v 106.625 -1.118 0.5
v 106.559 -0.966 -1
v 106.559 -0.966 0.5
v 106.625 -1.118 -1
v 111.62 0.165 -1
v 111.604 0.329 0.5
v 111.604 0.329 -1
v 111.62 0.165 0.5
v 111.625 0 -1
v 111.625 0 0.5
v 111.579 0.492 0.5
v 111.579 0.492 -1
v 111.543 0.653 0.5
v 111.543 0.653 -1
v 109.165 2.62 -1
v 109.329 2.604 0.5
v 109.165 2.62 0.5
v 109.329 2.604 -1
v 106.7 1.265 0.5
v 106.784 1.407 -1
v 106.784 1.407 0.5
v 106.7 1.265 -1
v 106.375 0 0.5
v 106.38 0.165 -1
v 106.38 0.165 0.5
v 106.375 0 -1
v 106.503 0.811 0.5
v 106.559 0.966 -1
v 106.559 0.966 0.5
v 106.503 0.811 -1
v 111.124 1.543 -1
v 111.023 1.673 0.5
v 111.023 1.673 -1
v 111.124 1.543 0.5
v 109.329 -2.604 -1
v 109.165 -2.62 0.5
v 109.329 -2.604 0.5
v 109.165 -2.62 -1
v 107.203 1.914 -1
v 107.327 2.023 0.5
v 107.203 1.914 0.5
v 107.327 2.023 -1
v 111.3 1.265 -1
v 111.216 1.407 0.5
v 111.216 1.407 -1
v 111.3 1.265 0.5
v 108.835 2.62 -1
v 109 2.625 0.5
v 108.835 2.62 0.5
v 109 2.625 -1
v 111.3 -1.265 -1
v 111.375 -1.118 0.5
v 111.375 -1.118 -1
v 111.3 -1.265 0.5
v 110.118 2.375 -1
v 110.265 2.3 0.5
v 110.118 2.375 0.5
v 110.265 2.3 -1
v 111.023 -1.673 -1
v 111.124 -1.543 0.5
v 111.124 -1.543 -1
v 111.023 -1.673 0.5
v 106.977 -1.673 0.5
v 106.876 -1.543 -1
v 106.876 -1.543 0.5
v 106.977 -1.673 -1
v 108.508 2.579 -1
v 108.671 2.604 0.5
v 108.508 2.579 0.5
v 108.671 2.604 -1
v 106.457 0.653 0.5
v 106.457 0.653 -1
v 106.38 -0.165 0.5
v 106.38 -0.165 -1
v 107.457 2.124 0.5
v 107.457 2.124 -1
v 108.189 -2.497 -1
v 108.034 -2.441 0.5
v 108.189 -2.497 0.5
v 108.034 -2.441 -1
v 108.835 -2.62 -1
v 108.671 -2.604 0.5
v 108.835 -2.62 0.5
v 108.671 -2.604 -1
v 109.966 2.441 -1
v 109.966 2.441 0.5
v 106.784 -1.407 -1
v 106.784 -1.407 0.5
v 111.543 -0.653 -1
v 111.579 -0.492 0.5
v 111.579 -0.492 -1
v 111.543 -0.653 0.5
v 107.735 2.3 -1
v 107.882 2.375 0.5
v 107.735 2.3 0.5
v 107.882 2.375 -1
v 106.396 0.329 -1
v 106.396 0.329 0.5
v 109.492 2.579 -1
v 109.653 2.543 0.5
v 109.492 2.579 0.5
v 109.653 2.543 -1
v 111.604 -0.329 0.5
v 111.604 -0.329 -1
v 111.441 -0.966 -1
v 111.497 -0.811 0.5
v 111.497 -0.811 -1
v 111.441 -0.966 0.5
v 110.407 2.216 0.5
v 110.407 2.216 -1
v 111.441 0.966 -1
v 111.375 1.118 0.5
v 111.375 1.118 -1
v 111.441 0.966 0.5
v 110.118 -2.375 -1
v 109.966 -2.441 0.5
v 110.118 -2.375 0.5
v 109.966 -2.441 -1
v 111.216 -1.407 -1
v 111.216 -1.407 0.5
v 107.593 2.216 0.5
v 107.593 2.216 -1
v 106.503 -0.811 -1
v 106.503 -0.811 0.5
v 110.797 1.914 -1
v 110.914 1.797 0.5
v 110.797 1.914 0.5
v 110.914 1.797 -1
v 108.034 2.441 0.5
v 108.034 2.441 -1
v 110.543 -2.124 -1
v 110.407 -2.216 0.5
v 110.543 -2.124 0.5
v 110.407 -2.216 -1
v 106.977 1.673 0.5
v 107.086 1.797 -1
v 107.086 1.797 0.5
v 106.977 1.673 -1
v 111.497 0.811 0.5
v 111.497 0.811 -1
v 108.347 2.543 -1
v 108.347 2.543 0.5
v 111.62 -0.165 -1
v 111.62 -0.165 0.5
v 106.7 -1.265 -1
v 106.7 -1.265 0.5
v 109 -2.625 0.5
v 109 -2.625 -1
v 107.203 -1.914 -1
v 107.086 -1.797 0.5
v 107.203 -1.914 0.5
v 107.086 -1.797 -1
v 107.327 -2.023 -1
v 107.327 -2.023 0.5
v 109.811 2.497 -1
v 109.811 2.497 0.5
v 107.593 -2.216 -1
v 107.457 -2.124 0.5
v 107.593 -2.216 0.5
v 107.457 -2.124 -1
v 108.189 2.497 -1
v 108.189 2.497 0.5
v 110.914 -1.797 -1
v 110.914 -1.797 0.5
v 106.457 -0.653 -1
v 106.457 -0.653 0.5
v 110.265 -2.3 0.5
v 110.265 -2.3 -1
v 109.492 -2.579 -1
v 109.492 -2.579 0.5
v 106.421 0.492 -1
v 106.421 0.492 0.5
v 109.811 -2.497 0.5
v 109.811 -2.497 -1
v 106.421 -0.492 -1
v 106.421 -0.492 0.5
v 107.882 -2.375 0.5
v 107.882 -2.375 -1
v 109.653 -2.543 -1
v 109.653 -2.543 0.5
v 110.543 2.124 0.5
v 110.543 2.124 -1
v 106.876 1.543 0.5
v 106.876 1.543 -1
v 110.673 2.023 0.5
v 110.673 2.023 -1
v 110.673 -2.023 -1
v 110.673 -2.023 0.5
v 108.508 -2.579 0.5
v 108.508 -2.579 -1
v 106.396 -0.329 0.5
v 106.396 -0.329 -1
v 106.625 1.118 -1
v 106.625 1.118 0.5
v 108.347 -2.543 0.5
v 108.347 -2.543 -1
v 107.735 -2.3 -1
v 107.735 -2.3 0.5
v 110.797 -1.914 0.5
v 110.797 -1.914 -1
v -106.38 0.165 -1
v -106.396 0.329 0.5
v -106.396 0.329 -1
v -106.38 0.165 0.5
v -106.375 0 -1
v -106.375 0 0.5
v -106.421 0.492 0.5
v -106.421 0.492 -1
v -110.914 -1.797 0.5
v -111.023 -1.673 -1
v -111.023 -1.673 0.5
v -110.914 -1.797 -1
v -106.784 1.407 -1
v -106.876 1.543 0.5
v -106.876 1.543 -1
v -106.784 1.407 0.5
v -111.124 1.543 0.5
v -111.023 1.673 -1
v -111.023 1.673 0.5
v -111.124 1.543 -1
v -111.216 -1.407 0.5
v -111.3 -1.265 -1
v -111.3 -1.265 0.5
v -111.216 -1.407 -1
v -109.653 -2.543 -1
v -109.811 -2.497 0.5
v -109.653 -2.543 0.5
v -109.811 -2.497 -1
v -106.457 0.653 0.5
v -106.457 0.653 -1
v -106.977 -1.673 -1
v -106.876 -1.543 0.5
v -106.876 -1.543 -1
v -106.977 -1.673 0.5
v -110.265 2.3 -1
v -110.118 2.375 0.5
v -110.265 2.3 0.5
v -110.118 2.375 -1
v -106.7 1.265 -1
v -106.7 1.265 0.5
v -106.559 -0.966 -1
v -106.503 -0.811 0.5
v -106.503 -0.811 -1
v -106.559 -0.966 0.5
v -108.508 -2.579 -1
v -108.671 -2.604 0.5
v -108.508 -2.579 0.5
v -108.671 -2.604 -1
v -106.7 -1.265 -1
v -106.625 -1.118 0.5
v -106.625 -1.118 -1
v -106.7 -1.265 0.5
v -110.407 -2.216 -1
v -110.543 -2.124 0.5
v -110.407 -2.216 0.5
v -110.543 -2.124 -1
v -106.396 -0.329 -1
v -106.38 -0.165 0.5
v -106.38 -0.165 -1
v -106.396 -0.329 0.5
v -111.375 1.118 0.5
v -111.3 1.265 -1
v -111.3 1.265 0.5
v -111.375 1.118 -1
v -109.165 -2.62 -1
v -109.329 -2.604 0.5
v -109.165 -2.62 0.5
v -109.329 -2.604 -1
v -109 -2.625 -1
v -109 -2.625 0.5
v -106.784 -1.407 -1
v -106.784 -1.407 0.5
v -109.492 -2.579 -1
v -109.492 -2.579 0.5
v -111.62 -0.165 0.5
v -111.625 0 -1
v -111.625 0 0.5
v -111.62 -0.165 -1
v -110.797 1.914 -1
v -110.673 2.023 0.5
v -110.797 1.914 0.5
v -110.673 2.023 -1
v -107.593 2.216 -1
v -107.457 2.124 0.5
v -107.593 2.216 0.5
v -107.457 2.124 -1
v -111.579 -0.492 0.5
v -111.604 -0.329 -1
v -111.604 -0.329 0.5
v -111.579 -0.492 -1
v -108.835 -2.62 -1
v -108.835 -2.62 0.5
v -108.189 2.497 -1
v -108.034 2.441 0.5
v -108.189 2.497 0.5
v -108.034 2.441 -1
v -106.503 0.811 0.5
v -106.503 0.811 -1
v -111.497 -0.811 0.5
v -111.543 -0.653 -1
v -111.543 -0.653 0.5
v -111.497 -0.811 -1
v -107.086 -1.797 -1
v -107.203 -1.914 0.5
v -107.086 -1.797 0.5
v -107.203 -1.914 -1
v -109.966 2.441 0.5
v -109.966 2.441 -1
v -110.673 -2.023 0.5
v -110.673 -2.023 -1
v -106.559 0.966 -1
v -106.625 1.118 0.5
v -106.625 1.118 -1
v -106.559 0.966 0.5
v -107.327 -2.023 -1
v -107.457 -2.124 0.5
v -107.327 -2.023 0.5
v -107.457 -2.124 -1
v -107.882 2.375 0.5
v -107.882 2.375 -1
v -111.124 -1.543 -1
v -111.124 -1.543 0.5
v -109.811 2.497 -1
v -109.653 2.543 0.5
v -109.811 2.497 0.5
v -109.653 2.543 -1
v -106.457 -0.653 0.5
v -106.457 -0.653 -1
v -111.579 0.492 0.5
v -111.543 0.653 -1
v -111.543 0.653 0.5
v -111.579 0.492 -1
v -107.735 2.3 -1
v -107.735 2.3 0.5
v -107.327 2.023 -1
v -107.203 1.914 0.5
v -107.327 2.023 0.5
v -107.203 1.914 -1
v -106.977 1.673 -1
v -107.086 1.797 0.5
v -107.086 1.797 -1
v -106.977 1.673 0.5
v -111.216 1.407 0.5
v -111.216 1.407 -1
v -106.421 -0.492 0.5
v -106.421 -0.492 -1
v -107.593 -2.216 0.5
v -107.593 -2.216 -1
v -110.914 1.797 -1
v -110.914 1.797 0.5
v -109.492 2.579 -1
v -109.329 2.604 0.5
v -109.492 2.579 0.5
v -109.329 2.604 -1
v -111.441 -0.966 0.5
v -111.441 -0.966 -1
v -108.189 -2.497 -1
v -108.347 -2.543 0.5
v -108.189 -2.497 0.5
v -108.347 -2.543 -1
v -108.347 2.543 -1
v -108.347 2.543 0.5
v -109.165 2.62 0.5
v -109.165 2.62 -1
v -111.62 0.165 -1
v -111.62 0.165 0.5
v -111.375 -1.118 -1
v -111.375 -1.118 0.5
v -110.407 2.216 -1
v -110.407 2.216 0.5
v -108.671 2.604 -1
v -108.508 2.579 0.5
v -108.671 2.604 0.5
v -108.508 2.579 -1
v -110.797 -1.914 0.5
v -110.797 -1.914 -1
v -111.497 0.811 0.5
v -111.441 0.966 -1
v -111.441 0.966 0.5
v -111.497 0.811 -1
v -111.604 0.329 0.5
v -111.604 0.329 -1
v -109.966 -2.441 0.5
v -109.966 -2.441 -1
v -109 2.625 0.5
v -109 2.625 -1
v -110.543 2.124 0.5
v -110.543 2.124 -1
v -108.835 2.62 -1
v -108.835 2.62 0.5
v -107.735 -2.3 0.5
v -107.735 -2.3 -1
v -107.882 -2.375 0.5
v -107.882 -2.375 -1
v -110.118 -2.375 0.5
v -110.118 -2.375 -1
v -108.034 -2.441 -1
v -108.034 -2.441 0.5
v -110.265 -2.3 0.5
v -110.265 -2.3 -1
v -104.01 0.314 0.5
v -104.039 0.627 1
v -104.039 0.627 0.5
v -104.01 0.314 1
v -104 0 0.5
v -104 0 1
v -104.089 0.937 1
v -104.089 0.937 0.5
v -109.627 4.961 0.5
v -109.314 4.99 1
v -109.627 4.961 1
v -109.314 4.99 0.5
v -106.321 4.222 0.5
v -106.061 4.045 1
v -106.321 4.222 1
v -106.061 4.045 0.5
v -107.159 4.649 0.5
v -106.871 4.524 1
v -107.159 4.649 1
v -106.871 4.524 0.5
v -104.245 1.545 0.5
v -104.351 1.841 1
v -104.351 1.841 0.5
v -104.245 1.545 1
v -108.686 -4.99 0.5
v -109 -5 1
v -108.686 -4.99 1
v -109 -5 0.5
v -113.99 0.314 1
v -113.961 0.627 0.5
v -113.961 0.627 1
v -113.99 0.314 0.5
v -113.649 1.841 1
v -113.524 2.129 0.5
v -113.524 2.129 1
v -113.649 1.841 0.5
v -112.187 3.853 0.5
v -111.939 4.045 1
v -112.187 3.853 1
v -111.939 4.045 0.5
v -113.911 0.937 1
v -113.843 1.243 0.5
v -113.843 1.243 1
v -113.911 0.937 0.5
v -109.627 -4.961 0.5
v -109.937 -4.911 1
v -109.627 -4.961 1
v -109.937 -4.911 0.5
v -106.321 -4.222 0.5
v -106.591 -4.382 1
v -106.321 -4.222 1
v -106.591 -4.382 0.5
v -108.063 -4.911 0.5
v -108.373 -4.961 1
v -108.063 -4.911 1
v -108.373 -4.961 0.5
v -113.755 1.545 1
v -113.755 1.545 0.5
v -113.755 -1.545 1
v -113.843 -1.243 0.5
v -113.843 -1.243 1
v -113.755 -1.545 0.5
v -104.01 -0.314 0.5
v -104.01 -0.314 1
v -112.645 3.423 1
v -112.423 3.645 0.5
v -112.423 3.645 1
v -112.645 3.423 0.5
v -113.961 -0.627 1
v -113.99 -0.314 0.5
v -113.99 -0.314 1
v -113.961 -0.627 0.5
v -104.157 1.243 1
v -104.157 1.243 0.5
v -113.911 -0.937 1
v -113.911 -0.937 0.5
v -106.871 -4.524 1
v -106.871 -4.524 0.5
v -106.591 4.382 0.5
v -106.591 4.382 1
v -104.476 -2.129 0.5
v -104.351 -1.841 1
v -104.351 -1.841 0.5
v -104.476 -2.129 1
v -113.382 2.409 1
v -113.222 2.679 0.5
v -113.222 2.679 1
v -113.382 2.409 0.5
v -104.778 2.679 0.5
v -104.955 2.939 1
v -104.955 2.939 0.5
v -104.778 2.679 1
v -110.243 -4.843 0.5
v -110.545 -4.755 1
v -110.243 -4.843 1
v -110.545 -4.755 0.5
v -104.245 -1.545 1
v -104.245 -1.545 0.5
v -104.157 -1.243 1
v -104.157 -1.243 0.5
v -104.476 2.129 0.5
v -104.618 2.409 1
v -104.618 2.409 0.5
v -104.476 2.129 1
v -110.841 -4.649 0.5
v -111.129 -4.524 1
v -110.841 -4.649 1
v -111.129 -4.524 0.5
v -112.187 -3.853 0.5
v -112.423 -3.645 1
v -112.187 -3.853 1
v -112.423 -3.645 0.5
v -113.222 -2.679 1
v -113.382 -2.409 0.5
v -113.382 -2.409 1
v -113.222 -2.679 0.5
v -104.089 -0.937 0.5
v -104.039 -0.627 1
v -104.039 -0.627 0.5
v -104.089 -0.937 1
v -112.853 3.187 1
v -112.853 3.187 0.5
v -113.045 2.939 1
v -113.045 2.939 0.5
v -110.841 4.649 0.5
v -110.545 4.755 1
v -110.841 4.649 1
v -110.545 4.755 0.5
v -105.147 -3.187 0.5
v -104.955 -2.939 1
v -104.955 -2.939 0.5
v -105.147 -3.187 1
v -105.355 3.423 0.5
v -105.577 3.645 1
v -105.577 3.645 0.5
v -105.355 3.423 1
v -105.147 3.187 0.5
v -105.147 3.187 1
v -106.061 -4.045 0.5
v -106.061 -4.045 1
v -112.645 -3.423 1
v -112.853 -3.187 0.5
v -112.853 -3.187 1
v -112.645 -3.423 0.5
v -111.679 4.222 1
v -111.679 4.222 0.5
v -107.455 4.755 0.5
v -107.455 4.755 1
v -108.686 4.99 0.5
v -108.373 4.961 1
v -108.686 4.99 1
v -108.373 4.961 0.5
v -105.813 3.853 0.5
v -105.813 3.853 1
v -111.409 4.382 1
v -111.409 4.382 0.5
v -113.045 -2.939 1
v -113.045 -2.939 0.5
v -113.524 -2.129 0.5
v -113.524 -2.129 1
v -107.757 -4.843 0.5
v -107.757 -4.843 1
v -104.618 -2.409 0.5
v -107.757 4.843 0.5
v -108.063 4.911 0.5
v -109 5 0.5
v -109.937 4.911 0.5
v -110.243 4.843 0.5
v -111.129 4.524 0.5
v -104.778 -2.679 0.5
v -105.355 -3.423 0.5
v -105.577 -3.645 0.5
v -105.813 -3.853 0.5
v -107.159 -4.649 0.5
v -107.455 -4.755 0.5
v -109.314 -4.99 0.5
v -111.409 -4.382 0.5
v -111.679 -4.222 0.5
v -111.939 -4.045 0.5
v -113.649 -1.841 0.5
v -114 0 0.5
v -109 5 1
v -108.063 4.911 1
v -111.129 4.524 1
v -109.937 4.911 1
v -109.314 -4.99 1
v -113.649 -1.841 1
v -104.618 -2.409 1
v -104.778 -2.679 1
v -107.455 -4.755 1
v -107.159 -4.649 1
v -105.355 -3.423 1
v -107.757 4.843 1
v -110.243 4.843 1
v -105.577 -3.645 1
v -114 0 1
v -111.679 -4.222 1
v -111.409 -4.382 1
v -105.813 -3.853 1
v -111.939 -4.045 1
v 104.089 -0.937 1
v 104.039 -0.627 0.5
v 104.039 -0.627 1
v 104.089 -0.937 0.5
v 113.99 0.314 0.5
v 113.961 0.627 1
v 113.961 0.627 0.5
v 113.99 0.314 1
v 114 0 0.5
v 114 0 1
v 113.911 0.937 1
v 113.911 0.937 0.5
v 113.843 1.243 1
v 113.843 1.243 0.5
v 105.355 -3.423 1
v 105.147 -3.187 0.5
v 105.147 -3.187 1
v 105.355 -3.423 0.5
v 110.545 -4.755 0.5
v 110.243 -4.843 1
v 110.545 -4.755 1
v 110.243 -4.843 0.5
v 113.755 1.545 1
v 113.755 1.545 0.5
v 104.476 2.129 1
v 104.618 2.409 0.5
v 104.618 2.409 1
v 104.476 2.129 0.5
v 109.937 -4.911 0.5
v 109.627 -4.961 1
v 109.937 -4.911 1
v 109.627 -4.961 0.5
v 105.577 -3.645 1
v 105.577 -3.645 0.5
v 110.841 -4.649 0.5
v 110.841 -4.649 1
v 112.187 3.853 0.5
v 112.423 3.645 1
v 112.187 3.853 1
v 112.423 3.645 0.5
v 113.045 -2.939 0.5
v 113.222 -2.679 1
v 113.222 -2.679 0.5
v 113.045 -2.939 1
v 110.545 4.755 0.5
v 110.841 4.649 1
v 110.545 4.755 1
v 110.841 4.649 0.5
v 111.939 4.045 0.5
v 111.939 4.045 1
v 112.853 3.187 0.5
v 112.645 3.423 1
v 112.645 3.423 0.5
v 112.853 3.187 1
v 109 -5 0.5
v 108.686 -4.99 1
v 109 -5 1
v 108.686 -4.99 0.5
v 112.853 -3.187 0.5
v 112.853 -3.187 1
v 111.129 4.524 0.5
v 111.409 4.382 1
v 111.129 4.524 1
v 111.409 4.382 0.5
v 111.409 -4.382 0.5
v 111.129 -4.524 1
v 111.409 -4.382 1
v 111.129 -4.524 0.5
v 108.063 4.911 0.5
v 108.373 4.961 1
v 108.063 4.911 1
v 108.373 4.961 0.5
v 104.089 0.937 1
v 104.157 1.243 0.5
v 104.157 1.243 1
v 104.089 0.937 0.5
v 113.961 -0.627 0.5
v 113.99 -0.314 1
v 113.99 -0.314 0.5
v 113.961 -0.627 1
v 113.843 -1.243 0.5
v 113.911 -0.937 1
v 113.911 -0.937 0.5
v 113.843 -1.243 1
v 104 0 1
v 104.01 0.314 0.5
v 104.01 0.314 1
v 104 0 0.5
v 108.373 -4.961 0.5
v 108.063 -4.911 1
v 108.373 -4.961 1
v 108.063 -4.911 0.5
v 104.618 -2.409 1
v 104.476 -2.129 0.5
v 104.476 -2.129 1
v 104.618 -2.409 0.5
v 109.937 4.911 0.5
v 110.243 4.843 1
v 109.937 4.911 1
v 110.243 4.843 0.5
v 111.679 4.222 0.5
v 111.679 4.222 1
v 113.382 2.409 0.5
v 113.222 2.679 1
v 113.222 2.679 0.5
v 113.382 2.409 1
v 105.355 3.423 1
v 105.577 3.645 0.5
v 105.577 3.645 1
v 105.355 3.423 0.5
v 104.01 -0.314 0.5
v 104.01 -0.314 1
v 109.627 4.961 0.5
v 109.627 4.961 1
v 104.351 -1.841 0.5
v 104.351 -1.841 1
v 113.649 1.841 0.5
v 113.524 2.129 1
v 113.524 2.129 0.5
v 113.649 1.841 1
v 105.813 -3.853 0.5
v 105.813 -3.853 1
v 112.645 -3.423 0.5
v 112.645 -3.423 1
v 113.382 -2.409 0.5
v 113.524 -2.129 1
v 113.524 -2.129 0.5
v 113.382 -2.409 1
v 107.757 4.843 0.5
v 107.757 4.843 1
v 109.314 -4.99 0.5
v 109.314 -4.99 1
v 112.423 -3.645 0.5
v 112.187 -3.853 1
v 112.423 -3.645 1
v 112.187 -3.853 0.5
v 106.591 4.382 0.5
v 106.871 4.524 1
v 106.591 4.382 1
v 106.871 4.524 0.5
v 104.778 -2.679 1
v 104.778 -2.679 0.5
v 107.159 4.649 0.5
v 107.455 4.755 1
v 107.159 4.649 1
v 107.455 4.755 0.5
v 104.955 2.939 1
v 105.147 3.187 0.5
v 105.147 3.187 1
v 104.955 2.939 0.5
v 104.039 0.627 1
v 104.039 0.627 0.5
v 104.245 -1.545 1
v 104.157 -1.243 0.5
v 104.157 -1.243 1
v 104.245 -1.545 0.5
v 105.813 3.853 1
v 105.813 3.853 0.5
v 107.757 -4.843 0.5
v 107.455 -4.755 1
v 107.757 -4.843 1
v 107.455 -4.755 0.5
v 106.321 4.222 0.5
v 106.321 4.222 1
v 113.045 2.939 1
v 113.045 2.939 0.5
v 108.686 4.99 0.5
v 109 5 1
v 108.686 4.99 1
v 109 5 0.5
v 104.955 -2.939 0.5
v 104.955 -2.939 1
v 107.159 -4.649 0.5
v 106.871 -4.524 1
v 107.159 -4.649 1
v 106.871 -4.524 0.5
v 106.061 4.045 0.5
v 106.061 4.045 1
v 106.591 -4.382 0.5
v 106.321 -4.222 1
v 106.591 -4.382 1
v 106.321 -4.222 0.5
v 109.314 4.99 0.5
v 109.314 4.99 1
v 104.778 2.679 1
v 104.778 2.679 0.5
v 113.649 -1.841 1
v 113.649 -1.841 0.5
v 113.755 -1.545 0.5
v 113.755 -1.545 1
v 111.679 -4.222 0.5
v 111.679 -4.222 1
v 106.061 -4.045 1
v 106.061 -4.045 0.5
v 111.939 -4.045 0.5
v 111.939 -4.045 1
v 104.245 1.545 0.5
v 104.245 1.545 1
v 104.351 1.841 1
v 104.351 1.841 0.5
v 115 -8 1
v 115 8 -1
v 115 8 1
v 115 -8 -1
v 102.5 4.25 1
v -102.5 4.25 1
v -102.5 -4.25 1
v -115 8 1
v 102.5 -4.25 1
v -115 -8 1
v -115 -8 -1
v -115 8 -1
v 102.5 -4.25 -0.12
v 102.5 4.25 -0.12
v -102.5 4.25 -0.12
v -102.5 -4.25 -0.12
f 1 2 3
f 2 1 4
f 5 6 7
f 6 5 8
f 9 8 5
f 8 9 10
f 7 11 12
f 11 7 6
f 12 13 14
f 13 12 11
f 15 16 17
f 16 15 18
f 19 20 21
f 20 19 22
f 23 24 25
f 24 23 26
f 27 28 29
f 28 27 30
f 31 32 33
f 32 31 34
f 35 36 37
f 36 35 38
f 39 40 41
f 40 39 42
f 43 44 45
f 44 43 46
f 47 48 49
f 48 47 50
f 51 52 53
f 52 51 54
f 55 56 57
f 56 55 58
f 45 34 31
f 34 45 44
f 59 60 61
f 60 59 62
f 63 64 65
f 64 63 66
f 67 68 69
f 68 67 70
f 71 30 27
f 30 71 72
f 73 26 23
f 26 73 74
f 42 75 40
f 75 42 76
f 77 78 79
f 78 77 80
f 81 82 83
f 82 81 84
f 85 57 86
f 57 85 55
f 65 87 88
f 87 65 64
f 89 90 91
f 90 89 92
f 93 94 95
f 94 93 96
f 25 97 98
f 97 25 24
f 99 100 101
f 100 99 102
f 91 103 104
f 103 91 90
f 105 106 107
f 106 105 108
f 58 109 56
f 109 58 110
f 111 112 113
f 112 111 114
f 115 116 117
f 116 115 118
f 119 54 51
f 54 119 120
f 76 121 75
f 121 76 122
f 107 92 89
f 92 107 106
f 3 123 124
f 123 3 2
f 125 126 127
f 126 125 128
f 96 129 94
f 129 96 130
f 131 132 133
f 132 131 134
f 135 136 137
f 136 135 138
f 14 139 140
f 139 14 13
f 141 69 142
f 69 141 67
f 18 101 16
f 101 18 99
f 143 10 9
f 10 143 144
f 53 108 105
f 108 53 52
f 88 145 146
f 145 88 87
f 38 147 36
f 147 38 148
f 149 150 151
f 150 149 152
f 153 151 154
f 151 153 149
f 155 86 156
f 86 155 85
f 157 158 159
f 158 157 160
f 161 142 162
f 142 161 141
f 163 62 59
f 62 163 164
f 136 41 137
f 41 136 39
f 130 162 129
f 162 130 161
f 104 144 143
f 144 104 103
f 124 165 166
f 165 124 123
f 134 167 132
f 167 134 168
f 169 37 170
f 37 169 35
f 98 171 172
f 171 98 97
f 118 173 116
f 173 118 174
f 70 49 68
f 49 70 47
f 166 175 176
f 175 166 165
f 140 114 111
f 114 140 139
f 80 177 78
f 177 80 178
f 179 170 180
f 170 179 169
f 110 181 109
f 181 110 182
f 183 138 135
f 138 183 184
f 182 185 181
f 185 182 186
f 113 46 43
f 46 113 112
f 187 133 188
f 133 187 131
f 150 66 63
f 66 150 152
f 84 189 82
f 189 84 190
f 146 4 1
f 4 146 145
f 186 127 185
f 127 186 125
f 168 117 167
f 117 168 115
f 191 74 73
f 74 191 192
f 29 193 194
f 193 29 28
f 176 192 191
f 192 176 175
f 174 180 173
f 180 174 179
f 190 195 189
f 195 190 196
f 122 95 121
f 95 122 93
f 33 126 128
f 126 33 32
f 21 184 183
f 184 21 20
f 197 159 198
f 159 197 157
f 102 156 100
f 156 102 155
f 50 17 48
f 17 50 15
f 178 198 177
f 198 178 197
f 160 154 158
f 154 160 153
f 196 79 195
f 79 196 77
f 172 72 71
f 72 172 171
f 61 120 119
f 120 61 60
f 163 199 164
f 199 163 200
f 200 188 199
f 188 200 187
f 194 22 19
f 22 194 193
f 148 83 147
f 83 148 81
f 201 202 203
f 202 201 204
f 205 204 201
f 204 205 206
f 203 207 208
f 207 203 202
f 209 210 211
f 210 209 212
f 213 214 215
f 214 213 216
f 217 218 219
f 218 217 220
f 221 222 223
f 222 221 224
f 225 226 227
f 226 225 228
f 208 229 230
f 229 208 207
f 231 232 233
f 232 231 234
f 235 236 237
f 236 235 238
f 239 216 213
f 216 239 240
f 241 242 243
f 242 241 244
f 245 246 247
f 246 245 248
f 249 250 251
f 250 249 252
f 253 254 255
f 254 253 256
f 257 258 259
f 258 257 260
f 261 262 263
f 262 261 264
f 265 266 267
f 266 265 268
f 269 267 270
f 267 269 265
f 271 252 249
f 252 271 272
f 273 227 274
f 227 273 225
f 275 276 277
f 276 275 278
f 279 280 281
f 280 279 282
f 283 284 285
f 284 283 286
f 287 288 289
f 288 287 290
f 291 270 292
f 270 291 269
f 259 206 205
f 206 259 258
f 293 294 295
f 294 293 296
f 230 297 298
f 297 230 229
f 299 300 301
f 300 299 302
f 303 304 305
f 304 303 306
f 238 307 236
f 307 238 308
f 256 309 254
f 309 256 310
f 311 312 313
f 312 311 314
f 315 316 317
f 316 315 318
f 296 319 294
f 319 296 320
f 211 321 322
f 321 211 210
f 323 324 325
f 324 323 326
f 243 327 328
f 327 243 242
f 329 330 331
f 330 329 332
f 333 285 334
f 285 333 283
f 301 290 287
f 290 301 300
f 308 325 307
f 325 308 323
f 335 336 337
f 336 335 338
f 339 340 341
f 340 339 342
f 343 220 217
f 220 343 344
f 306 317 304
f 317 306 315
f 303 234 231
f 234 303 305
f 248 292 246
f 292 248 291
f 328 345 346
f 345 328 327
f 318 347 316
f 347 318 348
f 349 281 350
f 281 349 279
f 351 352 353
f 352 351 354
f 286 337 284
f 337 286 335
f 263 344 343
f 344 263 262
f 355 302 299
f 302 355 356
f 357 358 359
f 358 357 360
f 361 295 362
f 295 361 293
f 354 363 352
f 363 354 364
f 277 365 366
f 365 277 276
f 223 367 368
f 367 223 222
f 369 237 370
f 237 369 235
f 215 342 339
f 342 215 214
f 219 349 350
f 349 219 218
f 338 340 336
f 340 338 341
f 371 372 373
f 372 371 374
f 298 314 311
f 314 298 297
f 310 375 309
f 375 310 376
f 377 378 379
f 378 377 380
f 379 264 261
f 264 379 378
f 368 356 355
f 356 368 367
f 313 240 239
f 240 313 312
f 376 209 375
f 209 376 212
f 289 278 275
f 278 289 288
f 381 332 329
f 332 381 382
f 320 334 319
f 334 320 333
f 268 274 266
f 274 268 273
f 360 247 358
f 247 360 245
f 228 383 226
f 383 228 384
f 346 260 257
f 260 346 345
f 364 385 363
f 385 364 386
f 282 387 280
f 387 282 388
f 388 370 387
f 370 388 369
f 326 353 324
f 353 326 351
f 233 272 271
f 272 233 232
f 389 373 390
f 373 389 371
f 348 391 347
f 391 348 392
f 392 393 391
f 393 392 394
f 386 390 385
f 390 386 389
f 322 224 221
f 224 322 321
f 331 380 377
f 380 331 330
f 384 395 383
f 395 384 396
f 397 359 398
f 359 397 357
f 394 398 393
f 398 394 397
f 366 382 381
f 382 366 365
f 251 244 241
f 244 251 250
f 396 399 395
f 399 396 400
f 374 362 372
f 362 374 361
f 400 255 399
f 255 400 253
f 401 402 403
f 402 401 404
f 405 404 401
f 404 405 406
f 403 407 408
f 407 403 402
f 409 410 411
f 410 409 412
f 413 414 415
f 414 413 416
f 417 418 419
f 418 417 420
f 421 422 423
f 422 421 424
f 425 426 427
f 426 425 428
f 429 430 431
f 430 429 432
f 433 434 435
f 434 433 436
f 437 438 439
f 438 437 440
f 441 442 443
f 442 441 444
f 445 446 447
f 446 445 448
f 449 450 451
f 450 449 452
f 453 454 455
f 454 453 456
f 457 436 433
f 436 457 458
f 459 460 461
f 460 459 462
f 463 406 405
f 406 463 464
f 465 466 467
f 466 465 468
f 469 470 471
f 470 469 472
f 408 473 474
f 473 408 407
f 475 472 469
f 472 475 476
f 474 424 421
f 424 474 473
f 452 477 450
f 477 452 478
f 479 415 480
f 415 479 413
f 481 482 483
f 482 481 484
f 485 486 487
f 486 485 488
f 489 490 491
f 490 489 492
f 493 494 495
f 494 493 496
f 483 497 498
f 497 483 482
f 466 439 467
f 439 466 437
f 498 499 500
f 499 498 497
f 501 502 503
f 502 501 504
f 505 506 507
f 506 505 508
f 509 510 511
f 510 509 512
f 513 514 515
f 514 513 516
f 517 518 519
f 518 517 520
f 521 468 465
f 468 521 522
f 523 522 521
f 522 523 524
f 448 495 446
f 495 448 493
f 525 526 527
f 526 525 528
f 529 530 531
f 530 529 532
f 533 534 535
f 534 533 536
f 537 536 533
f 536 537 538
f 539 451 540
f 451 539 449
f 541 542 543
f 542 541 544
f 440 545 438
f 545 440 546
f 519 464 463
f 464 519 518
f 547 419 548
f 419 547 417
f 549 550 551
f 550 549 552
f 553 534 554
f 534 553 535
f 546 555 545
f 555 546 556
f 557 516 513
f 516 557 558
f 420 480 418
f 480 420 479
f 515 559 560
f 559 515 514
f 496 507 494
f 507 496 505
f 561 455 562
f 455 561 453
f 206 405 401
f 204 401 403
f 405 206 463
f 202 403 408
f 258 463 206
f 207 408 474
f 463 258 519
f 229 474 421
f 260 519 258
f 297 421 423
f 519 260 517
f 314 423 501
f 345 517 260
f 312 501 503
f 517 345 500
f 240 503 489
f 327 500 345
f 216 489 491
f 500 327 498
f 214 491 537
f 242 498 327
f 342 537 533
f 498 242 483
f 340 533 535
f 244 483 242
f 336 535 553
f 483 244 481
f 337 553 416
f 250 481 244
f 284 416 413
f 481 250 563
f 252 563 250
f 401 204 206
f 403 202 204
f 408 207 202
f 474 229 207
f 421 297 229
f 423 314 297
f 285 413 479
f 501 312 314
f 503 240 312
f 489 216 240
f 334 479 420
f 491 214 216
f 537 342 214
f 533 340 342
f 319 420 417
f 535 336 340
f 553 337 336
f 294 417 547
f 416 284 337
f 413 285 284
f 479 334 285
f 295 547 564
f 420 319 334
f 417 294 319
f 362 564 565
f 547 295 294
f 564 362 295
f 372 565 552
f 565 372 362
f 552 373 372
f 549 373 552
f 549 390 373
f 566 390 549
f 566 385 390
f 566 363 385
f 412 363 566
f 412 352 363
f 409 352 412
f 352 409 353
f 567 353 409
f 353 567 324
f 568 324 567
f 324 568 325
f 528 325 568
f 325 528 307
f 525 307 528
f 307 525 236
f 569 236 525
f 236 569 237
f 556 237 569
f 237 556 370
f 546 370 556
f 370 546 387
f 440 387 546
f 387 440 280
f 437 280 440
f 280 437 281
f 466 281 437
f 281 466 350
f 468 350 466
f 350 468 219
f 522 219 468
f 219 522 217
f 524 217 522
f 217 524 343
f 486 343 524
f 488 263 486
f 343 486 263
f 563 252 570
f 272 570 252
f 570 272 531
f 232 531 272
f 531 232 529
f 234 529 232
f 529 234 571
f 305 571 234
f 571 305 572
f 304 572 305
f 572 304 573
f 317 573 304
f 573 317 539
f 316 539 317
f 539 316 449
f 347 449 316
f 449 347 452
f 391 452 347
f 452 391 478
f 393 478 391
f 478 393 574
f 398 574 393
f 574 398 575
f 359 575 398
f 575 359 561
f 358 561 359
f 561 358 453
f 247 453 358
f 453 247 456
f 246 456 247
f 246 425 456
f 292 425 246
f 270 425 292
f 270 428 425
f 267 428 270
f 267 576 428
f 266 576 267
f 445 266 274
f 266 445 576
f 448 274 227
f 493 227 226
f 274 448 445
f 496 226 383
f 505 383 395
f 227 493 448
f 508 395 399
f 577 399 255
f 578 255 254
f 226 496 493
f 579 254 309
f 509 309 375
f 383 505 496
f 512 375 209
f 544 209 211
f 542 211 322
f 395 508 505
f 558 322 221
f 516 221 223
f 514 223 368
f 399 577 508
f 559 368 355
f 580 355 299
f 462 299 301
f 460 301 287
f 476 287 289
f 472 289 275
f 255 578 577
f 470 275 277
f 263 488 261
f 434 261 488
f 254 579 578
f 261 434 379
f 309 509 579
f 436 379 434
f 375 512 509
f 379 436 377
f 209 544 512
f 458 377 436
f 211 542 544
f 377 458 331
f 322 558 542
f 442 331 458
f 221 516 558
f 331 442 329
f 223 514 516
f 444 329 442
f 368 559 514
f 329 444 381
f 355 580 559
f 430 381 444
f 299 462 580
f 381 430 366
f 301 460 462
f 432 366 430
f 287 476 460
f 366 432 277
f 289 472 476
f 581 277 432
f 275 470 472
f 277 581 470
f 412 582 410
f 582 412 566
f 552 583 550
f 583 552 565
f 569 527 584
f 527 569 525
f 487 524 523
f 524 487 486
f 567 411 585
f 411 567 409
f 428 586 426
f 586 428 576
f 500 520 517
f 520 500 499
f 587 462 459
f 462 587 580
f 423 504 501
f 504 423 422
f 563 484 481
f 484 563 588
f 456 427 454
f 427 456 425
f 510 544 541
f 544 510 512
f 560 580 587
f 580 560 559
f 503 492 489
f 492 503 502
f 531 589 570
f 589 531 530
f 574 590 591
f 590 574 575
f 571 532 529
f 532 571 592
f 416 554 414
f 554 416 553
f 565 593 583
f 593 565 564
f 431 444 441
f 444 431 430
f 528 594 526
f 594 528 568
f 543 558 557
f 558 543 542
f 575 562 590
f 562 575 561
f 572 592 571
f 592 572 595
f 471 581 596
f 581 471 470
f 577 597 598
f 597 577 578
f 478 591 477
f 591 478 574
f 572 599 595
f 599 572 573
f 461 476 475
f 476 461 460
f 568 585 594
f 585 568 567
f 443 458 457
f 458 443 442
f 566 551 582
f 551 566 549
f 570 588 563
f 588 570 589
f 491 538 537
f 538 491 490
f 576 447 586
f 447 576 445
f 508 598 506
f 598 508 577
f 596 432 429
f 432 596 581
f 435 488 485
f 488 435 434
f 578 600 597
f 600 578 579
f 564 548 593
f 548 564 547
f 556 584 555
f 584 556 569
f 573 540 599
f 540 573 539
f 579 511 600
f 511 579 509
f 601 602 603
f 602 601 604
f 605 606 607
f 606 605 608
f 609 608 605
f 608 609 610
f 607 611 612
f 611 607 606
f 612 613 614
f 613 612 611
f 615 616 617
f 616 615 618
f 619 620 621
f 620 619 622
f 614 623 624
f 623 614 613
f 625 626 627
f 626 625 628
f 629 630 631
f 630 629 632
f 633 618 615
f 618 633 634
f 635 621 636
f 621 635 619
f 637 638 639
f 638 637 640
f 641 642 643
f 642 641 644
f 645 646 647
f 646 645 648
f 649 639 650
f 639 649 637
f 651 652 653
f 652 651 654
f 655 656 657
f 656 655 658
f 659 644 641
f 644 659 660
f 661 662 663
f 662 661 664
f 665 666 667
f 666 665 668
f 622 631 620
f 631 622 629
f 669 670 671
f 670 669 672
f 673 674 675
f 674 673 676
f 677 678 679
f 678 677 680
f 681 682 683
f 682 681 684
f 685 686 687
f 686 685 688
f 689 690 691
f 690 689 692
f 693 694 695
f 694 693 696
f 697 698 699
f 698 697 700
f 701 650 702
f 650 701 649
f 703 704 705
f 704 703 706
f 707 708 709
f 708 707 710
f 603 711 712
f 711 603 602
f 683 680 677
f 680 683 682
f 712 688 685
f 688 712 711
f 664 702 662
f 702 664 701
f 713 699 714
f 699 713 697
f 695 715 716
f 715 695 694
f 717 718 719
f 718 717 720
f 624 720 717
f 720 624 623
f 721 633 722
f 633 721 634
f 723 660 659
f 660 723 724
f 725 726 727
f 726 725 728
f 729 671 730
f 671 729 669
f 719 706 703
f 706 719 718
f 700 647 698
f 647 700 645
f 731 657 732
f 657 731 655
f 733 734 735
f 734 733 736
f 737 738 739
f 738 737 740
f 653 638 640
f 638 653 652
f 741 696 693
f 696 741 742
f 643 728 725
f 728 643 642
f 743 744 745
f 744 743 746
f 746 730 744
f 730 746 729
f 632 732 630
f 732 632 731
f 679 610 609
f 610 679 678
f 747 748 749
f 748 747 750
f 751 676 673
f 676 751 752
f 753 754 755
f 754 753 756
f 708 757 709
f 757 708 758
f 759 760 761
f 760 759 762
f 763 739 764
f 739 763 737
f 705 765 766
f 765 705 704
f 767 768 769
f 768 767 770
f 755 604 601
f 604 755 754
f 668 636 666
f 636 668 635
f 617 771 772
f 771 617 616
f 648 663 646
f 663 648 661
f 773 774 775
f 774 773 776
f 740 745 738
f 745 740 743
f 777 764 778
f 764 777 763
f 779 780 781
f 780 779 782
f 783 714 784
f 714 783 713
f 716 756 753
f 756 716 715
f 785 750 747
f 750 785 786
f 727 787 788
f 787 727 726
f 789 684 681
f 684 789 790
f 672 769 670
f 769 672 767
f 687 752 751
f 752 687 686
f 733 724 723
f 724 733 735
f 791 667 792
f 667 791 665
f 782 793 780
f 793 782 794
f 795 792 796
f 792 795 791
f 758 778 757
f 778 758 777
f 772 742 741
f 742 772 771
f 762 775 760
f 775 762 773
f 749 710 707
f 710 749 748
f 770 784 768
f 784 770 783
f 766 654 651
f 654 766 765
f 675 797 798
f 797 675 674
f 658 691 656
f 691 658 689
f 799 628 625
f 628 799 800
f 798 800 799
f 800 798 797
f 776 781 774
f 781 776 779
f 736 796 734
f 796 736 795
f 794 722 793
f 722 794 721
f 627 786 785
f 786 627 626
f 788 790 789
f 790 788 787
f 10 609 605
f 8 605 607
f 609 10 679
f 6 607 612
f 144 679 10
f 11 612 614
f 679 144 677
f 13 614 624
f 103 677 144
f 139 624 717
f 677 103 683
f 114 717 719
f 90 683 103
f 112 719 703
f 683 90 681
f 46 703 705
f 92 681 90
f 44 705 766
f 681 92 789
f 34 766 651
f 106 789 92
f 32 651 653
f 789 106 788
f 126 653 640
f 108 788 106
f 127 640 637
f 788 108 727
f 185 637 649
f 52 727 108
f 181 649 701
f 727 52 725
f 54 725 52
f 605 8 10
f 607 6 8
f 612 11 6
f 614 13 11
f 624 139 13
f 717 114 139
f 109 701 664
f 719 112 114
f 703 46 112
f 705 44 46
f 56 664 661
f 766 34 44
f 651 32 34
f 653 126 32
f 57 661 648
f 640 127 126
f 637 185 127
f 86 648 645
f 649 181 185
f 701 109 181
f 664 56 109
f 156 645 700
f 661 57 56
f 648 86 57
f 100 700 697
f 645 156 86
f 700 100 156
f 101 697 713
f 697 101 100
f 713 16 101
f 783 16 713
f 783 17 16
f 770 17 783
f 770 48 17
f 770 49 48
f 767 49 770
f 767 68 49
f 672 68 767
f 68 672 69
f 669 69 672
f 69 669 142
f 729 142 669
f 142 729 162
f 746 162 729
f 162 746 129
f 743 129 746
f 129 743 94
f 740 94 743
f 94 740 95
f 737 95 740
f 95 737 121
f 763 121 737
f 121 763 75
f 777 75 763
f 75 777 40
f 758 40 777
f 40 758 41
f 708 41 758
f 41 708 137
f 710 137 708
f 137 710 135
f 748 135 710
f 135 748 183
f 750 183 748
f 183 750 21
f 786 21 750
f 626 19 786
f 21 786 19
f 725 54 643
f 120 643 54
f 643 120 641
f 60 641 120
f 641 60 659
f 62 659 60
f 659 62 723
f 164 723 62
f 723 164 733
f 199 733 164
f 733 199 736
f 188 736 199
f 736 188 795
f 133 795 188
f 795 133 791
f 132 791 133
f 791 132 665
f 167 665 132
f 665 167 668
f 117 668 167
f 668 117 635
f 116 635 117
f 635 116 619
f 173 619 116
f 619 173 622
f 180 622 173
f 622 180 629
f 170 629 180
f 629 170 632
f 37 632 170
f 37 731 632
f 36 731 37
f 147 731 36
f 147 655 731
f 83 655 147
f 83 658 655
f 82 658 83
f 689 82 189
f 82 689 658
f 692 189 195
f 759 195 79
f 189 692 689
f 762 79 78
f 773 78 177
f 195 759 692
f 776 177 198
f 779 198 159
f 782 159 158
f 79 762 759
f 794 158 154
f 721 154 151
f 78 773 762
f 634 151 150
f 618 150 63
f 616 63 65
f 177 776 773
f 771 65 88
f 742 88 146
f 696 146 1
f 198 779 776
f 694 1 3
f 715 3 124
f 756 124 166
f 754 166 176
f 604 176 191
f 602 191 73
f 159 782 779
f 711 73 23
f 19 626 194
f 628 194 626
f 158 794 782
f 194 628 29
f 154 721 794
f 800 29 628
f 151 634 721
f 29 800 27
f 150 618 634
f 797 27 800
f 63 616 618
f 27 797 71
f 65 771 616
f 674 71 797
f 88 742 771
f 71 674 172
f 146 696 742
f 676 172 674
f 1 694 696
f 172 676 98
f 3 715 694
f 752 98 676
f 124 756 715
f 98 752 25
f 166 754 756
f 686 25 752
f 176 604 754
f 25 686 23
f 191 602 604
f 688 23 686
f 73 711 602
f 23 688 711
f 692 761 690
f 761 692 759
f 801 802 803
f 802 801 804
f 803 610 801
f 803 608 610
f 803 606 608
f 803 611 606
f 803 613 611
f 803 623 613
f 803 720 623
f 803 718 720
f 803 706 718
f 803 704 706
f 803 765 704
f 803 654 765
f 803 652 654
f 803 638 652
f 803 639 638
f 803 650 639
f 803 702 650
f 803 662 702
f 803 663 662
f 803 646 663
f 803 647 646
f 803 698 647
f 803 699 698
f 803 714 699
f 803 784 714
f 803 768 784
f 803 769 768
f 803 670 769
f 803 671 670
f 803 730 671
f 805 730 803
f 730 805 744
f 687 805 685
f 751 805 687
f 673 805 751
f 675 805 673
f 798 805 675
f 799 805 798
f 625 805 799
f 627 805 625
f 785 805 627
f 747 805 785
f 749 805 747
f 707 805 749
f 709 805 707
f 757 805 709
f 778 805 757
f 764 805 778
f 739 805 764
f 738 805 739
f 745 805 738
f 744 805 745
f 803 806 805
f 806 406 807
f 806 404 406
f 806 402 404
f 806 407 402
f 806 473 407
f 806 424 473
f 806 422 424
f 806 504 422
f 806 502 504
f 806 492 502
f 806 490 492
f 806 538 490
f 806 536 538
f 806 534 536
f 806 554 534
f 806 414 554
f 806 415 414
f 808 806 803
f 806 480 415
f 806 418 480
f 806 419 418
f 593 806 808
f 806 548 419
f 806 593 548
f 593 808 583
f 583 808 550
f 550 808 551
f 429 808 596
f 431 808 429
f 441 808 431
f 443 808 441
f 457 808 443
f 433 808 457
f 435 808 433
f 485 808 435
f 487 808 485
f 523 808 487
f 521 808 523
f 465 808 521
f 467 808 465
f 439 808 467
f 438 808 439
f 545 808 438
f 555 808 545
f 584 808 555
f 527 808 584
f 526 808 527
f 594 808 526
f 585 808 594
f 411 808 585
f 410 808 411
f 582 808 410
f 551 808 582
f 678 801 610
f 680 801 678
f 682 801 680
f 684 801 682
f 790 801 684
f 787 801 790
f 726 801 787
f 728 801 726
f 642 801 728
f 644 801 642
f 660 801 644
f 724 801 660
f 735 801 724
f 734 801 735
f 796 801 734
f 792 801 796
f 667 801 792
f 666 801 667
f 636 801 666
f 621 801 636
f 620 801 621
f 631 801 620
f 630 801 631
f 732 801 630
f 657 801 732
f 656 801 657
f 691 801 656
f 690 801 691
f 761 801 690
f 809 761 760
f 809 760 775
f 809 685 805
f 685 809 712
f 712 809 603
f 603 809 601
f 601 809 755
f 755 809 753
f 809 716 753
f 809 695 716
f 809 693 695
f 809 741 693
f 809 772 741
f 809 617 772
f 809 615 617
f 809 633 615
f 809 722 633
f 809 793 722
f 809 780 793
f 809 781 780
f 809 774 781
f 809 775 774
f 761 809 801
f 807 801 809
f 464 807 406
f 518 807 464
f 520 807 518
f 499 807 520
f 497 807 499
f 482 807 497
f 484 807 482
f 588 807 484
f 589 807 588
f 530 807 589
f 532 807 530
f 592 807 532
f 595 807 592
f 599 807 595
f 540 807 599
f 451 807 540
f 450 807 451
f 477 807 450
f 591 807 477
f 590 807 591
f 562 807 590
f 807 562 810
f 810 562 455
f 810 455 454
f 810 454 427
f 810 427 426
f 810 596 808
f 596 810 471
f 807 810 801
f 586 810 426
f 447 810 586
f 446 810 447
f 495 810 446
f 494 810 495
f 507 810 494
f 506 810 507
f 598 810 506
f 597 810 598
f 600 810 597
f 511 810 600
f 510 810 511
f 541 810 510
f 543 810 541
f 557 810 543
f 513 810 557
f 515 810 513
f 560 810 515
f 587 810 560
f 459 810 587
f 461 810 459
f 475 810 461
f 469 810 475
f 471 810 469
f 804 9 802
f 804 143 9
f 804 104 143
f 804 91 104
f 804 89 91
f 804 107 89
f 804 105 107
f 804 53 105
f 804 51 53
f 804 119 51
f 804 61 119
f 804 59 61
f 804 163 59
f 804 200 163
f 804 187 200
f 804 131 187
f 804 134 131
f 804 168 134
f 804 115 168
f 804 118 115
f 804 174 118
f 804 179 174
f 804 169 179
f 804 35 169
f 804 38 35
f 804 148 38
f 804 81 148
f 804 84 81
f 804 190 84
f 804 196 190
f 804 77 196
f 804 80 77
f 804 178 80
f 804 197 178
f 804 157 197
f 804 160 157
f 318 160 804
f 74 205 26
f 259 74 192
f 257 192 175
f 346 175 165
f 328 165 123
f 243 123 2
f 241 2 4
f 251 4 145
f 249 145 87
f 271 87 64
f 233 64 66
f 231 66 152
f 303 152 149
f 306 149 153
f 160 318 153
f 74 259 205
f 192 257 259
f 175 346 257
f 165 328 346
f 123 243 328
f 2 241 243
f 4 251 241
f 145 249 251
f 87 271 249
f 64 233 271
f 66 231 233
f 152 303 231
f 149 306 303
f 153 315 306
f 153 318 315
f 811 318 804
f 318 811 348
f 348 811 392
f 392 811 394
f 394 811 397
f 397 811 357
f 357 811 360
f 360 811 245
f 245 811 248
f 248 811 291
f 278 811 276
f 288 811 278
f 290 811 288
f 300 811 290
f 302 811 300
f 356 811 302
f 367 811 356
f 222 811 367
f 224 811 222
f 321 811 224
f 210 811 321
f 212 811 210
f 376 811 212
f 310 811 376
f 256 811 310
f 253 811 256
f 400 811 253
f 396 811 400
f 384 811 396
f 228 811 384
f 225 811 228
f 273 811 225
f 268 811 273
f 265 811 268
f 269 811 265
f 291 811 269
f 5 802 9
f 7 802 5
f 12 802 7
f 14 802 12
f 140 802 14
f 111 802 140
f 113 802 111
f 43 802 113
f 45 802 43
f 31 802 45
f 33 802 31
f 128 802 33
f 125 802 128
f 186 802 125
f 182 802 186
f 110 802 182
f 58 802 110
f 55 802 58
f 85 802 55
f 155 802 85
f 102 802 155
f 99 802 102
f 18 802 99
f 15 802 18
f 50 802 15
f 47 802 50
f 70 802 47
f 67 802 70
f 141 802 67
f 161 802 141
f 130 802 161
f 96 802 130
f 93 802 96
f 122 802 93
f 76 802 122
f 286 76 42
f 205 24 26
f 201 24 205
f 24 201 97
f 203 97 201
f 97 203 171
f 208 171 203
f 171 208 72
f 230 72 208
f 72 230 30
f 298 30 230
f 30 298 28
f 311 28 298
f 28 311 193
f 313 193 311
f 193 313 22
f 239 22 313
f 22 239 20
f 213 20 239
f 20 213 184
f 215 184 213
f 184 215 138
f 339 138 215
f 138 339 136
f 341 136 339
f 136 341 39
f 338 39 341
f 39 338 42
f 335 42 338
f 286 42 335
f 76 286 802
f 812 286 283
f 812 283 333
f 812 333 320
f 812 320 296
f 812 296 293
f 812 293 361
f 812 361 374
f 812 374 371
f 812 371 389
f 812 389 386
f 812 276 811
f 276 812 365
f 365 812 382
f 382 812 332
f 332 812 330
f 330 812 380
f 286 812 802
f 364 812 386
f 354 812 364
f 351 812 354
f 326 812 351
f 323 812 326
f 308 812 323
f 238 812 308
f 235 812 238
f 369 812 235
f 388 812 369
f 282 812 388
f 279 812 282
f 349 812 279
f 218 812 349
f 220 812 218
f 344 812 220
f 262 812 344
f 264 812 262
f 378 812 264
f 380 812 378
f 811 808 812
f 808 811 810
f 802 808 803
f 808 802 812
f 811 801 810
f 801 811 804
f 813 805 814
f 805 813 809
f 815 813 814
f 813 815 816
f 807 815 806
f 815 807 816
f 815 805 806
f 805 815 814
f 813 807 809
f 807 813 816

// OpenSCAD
//parametric lightbar for LED strips
// 2019 Troseph
// https://www.thingiverse.com/thing:3626559

$fn=100;
// LED specifics
ledl=205;
ledw=8.5;
ledh=2.24;
// baseplate specifics
bpw=16;
bph=2;
// screw specifics
//length of screw
screwh=9;
//diameter of screw
screwd=5.25;
//diameter of screwhead
screwhd=10;
//magic to make the baseplate the right length
bpl=ledl+(screwhd*2.5);

difference(){
  baseplate();
  translate([0,0,1])led();
  screwHoles();
}
module screwHoles(){
  translate([((bpl/2)-6),0,0])cylinder(h=screwh,d=screwd,center=true);
  translate([-((bpl/2)-6),0,0])cylinder(h=screwh,d=screwd,center=true);
  translate([-((bpl/2)-6),0,1])cylinder(h=1,d=screwhd,center=true);
  translate([((bpl/2)-6),0,1])cylinder(h=1,d=screwhd,center=true);
}
module baseplate(){
  cube([bpl,bpw,bph],true);
}
module led(){
  cube([ledl,ledw,ledh],true);
}
